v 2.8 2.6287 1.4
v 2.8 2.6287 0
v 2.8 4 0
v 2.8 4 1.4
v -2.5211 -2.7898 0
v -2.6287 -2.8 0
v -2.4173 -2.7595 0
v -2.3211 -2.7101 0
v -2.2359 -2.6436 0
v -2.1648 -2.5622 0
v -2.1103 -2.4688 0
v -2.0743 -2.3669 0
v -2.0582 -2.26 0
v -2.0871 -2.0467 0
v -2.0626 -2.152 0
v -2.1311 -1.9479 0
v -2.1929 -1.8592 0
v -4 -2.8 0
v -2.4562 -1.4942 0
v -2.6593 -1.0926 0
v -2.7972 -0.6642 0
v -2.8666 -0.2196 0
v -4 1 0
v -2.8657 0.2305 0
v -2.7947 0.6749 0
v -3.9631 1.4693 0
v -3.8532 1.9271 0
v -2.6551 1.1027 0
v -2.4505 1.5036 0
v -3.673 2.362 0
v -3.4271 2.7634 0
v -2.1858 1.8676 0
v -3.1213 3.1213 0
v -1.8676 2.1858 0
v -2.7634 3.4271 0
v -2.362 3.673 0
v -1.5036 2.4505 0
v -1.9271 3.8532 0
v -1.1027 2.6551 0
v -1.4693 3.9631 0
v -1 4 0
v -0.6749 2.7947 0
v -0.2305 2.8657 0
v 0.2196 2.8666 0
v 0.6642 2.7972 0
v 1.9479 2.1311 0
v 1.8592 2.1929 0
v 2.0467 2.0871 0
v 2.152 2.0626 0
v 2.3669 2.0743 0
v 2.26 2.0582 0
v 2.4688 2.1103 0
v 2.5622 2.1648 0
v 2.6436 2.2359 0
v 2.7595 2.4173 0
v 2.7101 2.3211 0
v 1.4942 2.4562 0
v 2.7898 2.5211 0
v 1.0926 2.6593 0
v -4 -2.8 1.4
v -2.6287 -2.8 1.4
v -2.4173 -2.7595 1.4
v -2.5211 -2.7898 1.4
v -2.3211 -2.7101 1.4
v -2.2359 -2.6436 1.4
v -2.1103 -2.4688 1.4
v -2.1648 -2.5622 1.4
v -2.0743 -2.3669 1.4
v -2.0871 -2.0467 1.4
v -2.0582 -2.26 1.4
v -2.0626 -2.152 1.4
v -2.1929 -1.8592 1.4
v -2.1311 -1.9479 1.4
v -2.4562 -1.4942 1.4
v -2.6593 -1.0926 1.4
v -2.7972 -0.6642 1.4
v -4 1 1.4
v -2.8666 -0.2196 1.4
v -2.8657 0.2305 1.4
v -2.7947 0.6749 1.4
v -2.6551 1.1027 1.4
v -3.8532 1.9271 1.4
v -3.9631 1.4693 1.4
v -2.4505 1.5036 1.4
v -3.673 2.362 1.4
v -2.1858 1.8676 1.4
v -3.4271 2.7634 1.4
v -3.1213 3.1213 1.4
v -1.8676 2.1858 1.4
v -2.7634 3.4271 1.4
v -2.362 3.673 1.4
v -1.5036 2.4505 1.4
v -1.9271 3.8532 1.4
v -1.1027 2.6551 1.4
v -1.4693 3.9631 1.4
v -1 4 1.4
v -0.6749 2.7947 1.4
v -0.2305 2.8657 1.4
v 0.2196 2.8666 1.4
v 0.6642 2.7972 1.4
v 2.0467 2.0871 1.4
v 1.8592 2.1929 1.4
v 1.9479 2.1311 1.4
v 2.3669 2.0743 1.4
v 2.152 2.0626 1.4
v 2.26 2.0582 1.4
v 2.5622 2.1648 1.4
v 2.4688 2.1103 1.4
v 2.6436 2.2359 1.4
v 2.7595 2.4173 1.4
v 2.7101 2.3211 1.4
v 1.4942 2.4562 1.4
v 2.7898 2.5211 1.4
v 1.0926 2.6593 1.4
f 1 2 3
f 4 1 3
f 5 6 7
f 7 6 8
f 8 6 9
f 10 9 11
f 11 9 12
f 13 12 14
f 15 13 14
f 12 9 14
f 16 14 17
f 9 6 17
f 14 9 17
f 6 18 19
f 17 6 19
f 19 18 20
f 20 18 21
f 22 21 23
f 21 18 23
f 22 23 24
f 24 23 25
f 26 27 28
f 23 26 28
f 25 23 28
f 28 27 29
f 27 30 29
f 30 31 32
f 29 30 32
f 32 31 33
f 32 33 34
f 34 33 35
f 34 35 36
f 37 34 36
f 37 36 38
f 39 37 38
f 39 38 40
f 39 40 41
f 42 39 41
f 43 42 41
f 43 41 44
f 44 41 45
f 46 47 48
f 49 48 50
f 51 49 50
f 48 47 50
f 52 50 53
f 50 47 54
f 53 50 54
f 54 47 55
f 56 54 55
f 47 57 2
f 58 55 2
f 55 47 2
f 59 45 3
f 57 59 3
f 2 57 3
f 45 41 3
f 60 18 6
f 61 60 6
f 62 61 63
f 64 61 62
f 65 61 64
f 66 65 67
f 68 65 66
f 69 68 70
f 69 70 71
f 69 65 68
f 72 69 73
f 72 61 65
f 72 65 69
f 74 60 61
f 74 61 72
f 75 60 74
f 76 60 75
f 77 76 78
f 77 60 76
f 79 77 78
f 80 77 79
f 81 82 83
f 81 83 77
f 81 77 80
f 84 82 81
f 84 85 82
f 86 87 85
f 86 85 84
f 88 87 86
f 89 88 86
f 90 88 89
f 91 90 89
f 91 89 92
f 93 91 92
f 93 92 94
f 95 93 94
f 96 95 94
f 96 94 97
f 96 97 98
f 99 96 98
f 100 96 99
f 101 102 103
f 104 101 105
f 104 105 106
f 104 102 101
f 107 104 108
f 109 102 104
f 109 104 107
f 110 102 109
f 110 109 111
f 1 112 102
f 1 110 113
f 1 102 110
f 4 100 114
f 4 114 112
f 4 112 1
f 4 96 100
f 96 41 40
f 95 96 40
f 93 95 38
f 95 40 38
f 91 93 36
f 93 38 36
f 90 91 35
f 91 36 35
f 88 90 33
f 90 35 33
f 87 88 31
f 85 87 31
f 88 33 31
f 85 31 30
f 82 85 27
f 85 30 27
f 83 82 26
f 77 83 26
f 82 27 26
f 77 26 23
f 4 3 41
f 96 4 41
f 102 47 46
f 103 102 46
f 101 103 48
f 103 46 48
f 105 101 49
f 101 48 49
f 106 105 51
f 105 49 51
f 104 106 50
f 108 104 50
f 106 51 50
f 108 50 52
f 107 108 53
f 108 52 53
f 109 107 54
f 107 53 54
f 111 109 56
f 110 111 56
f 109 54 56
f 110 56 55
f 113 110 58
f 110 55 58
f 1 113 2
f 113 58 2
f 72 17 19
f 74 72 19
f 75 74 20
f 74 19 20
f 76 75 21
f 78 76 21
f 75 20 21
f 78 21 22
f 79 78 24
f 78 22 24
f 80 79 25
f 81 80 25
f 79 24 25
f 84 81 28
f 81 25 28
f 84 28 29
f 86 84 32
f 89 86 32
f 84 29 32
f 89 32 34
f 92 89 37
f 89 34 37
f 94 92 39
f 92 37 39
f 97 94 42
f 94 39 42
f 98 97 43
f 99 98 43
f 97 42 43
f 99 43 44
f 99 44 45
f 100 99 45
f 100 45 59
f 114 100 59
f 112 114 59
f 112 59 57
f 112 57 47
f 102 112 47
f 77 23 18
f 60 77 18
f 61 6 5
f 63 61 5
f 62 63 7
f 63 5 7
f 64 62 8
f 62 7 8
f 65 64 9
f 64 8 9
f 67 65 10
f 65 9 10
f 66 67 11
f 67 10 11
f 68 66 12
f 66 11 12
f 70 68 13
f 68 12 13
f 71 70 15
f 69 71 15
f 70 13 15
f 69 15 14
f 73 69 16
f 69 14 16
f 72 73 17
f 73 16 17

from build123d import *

# Parameters (mm, degrees)
SALIENTE_EXTRUIR1_DEPTH = 1.4


with BuildPart() as part:
    # Croquis1 → Saliente-Extruir1 (new body)
    with BuildSketch(Plane.XY):
        with BuildLine():
            Line((2.8, 4), (-1, 4))
            ThreePointArc((-1, 4), (-3.121320344, 3.121320344), (-4, 1))
            Line((-4, 1), (-4, -2.8))
            Line((-4, -2.8), (-2.628688939, -2.8))
            ThreePointArc((-2.628688939, -2.8), (-2.110290924, -2.468813544), (-2.192918912, -1.859228778))
            ThreePointArc((-2.192918912, -1.859228778), (-2.032931996, 2.032931996), (1.859228778, 2.192918912))
            ThreePointArc((1.859228778, 2.192918912), (2.468813544, 2.110290924), (2.8, 2.628688939))
            Line((2.8, 2.628688939), (2.8, 4))
        make_face()
    extrude(amount=SALIENTE_EXTRUIR1_DEPTH)


solid = part.part
